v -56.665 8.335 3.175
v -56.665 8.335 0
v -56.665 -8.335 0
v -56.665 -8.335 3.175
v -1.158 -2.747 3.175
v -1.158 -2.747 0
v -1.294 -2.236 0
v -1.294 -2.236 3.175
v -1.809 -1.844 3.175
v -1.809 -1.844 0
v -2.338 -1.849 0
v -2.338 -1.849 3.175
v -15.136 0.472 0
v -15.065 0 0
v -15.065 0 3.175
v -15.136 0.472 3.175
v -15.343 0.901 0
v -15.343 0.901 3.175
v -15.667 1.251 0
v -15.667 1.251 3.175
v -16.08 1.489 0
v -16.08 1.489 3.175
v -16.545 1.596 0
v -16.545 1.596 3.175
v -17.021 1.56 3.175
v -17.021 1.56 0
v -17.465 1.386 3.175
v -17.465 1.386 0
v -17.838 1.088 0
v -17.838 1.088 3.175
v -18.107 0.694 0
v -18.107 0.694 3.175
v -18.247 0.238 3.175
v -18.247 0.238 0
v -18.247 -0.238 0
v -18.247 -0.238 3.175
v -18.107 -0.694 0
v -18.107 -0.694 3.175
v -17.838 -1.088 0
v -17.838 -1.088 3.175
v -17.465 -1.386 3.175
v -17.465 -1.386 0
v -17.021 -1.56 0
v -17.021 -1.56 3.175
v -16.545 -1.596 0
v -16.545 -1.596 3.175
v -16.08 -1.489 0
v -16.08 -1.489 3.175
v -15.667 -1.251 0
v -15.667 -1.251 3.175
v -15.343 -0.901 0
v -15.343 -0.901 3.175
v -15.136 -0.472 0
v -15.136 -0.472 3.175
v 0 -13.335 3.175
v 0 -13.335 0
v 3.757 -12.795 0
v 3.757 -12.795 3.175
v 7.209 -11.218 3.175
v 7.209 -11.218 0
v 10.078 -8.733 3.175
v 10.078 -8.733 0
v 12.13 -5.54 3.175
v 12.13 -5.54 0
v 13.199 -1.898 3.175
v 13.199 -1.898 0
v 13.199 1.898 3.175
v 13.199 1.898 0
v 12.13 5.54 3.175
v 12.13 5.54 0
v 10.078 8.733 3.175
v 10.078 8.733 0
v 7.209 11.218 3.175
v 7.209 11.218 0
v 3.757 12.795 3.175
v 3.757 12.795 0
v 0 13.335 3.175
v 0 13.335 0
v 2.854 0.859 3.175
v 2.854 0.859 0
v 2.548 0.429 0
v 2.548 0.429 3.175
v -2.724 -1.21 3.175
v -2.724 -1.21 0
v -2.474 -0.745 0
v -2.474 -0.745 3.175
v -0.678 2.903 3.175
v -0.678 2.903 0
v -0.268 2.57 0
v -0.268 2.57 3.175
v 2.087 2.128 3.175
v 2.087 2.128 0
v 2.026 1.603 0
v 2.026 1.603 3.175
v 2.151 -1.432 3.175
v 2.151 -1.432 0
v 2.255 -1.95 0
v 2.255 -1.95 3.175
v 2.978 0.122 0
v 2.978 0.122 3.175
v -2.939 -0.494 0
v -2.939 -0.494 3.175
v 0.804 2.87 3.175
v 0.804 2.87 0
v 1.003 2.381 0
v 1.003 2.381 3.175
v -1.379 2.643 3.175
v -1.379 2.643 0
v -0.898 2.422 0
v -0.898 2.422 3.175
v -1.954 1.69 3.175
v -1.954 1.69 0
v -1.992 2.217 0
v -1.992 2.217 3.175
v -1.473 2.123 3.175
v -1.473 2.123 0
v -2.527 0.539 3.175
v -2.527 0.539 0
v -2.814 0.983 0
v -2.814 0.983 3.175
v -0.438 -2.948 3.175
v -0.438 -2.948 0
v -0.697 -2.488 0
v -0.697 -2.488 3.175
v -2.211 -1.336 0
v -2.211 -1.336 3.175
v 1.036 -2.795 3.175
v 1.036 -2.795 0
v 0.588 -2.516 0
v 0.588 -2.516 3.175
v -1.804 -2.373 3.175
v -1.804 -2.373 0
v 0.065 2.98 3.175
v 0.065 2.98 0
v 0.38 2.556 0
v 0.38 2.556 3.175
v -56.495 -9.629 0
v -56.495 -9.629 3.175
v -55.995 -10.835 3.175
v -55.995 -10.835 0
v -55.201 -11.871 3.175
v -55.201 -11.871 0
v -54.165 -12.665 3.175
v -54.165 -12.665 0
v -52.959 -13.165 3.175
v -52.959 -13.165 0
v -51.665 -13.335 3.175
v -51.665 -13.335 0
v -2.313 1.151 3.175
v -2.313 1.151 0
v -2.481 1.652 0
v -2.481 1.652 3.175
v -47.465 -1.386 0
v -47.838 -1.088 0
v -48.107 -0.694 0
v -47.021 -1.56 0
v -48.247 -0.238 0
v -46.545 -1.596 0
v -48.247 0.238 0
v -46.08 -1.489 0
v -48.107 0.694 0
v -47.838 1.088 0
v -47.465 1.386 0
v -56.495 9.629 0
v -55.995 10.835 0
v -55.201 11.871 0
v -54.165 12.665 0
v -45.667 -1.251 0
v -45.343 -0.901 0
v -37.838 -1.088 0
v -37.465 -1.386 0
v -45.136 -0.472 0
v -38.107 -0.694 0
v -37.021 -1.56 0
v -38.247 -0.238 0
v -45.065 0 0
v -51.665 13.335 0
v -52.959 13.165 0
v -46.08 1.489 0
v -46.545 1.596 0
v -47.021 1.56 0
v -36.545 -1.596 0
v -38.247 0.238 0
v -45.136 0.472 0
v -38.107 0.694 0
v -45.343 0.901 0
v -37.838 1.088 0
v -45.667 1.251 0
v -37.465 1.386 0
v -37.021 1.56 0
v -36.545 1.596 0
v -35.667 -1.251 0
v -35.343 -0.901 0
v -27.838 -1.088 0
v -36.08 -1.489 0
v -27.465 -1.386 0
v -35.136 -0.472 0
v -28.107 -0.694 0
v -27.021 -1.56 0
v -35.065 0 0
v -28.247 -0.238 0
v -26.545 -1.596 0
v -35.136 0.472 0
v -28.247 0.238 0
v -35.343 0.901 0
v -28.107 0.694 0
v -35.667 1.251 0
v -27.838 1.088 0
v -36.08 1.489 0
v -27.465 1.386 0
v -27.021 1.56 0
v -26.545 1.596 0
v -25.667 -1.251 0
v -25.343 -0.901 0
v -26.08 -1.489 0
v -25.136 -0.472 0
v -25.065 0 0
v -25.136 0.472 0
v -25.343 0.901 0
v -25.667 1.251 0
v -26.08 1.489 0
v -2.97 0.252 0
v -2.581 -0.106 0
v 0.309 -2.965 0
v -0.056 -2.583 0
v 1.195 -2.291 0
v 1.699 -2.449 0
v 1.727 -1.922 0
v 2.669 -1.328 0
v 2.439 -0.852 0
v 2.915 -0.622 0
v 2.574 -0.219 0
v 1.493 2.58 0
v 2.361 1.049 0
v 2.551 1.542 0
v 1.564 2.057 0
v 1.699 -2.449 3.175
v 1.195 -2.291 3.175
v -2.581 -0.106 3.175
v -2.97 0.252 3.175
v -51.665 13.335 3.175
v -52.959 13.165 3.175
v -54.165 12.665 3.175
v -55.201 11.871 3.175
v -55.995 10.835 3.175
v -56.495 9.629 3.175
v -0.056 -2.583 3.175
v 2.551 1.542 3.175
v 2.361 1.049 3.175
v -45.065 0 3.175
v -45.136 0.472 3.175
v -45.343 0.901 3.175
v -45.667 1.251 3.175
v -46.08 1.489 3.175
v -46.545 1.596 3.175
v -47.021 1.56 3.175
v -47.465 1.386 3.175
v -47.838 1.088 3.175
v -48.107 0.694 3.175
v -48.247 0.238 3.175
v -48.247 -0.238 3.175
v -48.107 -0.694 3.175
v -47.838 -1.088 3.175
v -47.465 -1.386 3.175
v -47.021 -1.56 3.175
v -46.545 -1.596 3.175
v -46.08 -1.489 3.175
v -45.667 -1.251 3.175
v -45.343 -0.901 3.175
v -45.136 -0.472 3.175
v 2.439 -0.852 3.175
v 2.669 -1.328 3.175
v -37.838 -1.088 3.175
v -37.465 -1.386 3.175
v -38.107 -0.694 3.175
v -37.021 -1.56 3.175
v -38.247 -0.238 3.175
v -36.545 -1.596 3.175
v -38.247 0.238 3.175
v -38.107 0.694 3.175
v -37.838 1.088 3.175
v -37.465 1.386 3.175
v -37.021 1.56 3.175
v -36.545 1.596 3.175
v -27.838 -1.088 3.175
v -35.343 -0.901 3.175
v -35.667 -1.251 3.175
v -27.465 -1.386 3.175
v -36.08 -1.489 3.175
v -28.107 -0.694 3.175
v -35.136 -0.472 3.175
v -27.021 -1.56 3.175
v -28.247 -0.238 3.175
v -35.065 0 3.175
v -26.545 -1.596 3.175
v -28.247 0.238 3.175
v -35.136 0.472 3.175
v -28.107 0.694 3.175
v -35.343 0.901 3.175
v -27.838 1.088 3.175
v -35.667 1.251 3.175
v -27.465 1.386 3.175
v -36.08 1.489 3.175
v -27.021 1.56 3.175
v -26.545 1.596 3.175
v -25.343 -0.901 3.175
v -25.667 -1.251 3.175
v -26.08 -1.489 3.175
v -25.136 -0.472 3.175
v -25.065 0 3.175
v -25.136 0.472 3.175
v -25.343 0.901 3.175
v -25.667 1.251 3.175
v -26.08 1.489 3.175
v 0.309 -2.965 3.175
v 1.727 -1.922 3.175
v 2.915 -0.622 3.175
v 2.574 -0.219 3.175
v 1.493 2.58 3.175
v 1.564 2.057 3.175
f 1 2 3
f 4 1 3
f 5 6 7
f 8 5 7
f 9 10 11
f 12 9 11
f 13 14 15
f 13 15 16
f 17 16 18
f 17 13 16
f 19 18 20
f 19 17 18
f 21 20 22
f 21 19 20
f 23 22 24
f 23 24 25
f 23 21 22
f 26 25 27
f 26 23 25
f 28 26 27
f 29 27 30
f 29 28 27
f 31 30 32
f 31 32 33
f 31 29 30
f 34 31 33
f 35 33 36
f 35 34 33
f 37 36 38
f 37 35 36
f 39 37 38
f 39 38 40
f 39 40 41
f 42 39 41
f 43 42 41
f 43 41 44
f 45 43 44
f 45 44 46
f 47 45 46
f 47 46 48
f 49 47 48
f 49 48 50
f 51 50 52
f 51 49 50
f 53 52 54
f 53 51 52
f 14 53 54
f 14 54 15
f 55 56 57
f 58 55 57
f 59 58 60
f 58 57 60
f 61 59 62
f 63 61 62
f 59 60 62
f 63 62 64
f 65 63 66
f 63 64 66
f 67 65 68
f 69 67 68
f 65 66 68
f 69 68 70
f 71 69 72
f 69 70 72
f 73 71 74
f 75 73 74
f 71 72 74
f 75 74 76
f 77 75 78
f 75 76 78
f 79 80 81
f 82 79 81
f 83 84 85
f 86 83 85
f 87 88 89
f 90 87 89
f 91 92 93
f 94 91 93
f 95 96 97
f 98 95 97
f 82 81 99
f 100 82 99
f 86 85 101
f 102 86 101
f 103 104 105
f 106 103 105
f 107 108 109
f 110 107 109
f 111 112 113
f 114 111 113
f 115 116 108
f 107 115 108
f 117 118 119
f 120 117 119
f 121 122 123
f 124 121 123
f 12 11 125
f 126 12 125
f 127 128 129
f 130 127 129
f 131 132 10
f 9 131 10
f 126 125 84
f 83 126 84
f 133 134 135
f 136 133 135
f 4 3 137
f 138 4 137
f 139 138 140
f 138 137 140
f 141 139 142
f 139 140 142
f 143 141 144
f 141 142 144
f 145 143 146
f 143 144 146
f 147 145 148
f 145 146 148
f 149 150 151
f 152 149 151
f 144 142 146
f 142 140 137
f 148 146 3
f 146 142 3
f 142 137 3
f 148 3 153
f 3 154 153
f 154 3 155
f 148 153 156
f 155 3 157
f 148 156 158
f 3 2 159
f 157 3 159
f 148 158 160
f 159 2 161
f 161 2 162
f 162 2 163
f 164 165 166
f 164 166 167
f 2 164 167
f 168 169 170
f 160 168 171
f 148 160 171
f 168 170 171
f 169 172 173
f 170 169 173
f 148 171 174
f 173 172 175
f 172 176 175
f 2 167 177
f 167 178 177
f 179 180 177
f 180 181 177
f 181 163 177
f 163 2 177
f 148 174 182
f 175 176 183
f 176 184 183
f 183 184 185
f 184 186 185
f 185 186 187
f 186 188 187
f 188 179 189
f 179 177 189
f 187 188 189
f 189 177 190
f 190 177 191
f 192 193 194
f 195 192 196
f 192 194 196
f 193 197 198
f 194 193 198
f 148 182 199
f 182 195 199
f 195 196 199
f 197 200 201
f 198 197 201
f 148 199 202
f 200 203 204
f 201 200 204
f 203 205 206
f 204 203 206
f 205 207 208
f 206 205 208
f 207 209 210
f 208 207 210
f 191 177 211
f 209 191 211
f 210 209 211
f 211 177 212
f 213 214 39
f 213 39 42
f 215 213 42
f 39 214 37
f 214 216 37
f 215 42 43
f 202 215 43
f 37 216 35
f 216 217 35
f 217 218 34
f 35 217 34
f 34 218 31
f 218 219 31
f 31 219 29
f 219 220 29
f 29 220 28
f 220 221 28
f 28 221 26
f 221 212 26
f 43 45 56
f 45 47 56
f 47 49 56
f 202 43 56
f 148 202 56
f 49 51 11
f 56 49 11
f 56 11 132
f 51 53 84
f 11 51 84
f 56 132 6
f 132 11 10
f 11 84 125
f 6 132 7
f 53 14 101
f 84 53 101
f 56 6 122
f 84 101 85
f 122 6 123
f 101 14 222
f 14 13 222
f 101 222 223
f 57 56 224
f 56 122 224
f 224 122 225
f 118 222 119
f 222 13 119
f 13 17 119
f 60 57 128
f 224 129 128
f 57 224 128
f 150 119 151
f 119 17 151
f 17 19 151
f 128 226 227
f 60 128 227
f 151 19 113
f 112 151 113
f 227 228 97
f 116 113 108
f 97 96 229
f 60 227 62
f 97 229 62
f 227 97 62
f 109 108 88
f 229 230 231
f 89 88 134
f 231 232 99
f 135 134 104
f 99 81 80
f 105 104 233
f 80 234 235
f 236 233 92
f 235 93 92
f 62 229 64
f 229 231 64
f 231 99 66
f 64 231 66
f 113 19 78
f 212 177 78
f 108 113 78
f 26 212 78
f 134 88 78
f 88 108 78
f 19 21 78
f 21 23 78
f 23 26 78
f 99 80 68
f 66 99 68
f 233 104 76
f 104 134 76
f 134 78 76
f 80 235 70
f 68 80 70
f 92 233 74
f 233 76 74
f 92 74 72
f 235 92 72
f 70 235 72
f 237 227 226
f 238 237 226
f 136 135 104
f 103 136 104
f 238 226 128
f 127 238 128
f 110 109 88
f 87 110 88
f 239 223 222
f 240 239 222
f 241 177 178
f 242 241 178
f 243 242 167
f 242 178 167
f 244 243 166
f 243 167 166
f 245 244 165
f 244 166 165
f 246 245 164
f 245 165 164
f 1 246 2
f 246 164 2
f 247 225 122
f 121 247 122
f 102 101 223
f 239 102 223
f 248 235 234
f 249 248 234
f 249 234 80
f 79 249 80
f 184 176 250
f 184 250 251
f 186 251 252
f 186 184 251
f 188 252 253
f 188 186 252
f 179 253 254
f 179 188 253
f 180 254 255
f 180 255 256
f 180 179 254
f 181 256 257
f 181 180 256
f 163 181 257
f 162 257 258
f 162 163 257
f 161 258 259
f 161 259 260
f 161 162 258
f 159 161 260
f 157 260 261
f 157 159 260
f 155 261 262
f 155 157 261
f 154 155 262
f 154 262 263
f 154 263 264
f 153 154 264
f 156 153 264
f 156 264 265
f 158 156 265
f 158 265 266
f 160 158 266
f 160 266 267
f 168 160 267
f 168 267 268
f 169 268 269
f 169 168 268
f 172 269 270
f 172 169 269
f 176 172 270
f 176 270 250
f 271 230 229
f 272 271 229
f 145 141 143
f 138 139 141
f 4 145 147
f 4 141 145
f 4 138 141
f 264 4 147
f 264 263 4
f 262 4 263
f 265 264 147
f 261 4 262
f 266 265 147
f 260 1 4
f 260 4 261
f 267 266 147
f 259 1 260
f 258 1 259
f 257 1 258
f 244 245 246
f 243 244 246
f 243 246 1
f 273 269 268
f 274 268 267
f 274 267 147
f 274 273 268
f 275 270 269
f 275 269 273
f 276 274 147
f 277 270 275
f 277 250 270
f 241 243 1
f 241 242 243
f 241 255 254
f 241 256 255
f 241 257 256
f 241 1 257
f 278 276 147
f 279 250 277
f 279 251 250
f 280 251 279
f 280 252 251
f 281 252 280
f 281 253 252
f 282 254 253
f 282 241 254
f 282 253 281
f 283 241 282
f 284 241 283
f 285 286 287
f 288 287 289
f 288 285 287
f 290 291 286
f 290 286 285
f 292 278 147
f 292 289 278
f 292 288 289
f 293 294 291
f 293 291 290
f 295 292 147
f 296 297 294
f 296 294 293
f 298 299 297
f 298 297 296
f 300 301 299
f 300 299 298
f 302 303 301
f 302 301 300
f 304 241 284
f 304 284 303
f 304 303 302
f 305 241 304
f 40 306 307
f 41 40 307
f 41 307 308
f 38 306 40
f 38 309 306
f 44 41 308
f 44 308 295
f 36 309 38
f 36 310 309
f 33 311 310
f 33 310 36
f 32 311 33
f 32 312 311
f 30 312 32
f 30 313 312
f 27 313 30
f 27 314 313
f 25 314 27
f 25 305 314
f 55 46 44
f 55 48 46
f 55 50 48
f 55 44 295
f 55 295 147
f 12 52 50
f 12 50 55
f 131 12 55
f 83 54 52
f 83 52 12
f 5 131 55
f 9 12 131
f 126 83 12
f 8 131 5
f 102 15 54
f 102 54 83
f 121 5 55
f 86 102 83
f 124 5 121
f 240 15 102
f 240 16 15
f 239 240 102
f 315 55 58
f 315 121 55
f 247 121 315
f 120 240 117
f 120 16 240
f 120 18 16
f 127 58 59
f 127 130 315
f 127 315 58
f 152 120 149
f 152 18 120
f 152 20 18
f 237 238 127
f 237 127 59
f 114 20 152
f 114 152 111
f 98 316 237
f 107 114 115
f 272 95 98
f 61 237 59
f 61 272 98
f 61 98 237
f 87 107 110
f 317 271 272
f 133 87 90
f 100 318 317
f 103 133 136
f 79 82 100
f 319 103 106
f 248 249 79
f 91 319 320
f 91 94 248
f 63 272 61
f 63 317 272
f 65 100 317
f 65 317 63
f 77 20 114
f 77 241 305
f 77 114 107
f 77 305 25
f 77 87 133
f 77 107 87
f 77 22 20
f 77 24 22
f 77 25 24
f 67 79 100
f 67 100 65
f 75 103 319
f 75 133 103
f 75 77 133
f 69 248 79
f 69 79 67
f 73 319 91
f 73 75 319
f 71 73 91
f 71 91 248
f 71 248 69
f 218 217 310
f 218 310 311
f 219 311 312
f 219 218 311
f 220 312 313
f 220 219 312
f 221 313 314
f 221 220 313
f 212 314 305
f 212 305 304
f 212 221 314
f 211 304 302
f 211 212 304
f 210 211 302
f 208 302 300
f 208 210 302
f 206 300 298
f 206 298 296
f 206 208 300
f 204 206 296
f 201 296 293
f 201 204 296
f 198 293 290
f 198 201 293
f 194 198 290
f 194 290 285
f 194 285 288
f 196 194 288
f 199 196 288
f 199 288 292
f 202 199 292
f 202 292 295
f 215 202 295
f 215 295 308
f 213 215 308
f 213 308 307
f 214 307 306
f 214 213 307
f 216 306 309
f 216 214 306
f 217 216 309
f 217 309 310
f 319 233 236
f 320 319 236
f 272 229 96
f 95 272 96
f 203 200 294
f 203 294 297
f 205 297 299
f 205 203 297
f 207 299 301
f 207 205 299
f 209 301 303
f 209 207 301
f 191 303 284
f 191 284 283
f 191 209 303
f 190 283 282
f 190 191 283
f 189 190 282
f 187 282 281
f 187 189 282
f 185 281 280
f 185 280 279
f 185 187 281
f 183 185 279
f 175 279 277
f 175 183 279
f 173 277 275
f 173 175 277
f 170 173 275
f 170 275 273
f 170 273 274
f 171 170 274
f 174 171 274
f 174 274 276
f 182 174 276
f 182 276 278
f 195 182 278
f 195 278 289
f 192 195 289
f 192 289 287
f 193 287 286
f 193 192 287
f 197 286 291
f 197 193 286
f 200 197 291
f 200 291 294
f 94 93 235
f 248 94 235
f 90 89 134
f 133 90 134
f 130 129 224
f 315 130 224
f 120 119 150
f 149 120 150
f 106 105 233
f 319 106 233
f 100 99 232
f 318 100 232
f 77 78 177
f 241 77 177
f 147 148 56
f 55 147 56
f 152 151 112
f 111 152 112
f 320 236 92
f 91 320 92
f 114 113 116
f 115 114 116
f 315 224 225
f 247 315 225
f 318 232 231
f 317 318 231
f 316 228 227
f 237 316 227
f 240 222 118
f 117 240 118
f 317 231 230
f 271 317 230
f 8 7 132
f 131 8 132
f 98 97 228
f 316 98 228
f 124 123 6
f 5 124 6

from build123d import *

# Parameters (mm, degrees)
F0_R     = 1.6
F1_DEPTH = 3.175


with BuildPart() as f1:
    # F0 (on Top) → F1 (new body)
    with BuildSketch(Plane.XY):
        with BuildLine():
            Line((-51.6649944294, -13.3350055706), (0, -13.3350055706))
            ThreePointArc((0, -13.3350055706), (13.3350055706, 0), (0, 13.3350055706))
            Line((0, 13.3350055706), (-51.6649944294, 13.3350055706))
            ThreePointArc((-51.6649944294, 13.3350055706), (-55.2005283353, 11.8705394766), (-56.6649944294, 8.3350055706))
            Line((-56.6649944294, 8.3350055706), (-56.6649944294, -8.3350055706))
            ThreePointArc((-56.6649944294, -8.3350055706), (-55.2005283353, -11.8705394766), (-51.6649944294, -13.3350055706))
        make_face()
        with Locations((-46.6649944294, 0)):
            Circle(F0_R, mode=Mode.SUBTRACT)
        with Locations((-36.6649944294, 0)):
            Circle(F0_R, mode=Mode.SUBTRACT)
        with Locations((-26.6649944294, 0)):
            Circle(F0_R, mode=Mode.SUBTRACT)
        with Locations((-16.6649944294, 0)):
            Circle(F0_R, mode=Mode.SUBTRACT)
        Polygon((-2.3131272616, 1.150841372), (-2.4811892868, 1.651717782), (-1.9542535042, 1.6899369317), (-1.992472654, 2.2168727143), (-1.4725868119, 2.1228475389), (-1.3785616365, 2.6427333809), (-0.8983920744, 2.4223718279), (-0.6780305213, 2.90254139), (-0.2677480588, 2.5696895861), (0.0651037451, 2.9799720486), (0.379719552, 2.555544297), (0.8041473037, 2.8701601039), (1.0033279869, 2.380824761), (1.4926633298, 2.5800054442), (1.5638936344, 2.0565092492), (2.0873898293, 2.1277395538), (2.0261940932, 1.6029756981), (2.5509579489, 1.5417799619), (2.3611813253, 1.0487212884), (2.8542399989, 0.8589446648), (2.547806851, 0.4285718633), (2.9781796525, 0.1221387154), (2.574344302, -0.2185063082), (2.9149893256, -0.6223416587), (2.4391262327, -0.8518549247), (2.6686394987, -1.3277180175), (2.1506488918, -1.4316783634), (2.2546092377, -1.9496689703), (1.7270383715, -1.9215441851), (1.6989135863, -2.4491150513), (1.1949116786, -2.2906723188), (1.0364689461, -2.7946742265), (0.5877042905, -2.5158690862), (0.3088991502, -2.9646337418), (-0.0564307197, -2.5829845462), (-0.4380799154, -2.9483144161), (-0.6970199802, -2.4878015876), (-1.1575328087, -2.7467416524), (-1.2938129119, -2.2363009057), (-1.8042536586, -2.3725810089), (-1.80931082, -1.8442852134), (-2.3376066155, -1.8493423749), (-2.2111230752, -1.3363862984), (-2.7240791517, -1.209902758), (-2.4740023355, -0.7445173173), (-2.9393877762, -0.4944405012), (-2.5814309304, -0.105867575), (-2.9700038565, 0.2520892708), (-2.5266587261, 0.5394342163), (-2.8140036716, 0.9827793468), align=None, mode=Mode.SUBTRACT)
    extrude(amount=F1_DEPTH)


solid = f1.part
